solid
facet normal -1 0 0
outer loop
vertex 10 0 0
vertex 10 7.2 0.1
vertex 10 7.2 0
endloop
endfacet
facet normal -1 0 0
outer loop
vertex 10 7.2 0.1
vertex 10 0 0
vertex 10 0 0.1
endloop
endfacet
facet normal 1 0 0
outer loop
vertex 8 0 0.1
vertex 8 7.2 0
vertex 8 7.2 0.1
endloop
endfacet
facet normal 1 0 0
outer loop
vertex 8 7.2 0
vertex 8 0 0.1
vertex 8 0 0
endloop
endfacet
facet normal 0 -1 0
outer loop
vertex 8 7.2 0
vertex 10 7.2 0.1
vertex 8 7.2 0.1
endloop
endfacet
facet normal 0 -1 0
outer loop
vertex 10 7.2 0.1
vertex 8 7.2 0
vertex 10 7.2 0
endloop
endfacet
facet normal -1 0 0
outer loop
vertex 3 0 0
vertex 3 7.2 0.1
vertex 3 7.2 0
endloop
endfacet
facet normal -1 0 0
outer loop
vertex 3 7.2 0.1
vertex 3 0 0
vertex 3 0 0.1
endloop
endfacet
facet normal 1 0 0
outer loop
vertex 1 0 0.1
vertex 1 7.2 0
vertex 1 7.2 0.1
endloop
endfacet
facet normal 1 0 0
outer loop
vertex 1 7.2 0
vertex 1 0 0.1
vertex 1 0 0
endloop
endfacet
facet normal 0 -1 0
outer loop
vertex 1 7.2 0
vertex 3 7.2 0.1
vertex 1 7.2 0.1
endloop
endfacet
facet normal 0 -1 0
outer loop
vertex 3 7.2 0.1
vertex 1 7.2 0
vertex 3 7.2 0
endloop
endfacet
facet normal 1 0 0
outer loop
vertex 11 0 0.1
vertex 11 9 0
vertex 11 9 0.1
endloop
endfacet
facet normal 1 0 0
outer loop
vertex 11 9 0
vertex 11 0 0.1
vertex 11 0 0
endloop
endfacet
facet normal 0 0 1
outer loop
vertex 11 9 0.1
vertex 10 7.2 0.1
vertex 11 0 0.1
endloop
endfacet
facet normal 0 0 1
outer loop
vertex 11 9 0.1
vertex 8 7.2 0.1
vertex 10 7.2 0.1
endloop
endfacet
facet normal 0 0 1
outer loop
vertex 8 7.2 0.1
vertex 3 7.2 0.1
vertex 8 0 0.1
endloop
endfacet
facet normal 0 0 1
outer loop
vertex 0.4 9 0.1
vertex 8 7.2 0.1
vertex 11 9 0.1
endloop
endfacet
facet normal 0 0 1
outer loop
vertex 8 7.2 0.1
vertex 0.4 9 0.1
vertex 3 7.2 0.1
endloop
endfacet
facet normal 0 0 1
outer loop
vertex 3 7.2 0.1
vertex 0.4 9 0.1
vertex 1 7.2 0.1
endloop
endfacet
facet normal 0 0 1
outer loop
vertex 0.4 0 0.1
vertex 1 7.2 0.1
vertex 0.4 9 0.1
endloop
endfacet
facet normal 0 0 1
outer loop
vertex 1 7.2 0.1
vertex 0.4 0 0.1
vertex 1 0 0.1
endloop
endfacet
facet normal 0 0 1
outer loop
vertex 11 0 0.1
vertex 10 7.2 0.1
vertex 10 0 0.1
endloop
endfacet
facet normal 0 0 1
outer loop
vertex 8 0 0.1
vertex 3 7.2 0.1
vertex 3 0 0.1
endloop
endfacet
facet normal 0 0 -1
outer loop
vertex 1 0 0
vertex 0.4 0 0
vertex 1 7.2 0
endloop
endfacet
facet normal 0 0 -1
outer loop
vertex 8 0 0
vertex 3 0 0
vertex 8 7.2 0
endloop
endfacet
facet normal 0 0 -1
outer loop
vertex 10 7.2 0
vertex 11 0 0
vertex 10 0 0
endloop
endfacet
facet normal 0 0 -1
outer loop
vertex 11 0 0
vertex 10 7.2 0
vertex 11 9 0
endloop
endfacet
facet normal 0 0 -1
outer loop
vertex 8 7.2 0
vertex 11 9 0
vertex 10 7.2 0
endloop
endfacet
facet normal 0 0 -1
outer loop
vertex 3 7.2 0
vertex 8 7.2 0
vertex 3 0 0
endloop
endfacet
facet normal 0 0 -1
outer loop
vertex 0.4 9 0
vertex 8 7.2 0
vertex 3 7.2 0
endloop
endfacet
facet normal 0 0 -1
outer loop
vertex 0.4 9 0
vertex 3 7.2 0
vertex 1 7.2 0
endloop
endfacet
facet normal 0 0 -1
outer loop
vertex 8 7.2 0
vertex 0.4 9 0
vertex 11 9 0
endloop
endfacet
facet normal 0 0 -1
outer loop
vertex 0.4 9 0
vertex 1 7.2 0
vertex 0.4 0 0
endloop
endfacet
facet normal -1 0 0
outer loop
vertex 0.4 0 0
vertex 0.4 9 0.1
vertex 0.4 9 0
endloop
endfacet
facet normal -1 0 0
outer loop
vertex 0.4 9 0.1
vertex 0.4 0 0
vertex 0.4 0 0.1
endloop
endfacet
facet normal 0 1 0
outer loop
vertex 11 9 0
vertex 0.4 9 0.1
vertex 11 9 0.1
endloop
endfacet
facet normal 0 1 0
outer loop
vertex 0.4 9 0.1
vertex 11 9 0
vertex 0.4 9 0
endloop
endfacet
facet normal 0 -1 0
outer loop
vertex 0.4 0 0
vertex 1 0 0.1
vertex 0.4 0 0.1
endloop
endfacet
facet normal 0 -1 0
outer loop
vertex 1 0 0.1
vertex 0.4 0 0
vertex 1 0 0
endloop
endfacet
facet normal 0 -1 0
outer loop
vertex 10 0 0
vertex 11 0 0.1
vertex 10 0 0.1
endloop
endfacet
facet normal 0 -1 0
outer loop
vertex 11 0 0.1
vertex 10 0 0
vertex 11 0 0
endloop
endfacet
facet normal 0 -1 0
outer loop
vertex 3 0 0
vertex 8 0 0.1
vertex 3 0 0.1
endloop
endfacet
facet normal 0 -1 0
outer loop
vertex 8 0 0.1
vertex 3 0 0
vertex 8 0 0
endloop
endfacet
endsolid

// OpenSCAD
// usb a pinout: vcc, d-, d+, gnd
isolate_pins = [ 0, 1, 1, 0 ];
isolator_thickness = 0.1;
tolerance = 0.4;

{
    usb_a_male_outter_dimensions =  [ 12, 12, 4.5 ];
    usb_a_metal_casing_thickness = 0.3;
    usb_a_pin_offsets = [ 9, 6.5, 4.5, 2 ];
    usb_a_pin_width = 1;

    isolator_pin_depth = usb_a_male_outter_dimensions[1] - 3;
    groove_width = usb_a_pin_width * 2;

    difference() {
        translate([tolerance,0,0])
            cube([usb_a_male_outter_dimensions[0] - 2*usb_a_metal_casing_thickness - 2*tolerance, isolator_pin_depth, isolator_thickness]);
        for (pin = [0:len(isolate_pins) - 1]) {
            if (isolate_pins[pin] == 0) {
                translate([usb_a_pin_offsets[pin] - groove_width/2, -1, -isolator_thickness])
                    cube([groove_width, isolator_pin_depth * 0.8 + 1 , 3 * isolator_thickness]);
            }
        }
    }
}
